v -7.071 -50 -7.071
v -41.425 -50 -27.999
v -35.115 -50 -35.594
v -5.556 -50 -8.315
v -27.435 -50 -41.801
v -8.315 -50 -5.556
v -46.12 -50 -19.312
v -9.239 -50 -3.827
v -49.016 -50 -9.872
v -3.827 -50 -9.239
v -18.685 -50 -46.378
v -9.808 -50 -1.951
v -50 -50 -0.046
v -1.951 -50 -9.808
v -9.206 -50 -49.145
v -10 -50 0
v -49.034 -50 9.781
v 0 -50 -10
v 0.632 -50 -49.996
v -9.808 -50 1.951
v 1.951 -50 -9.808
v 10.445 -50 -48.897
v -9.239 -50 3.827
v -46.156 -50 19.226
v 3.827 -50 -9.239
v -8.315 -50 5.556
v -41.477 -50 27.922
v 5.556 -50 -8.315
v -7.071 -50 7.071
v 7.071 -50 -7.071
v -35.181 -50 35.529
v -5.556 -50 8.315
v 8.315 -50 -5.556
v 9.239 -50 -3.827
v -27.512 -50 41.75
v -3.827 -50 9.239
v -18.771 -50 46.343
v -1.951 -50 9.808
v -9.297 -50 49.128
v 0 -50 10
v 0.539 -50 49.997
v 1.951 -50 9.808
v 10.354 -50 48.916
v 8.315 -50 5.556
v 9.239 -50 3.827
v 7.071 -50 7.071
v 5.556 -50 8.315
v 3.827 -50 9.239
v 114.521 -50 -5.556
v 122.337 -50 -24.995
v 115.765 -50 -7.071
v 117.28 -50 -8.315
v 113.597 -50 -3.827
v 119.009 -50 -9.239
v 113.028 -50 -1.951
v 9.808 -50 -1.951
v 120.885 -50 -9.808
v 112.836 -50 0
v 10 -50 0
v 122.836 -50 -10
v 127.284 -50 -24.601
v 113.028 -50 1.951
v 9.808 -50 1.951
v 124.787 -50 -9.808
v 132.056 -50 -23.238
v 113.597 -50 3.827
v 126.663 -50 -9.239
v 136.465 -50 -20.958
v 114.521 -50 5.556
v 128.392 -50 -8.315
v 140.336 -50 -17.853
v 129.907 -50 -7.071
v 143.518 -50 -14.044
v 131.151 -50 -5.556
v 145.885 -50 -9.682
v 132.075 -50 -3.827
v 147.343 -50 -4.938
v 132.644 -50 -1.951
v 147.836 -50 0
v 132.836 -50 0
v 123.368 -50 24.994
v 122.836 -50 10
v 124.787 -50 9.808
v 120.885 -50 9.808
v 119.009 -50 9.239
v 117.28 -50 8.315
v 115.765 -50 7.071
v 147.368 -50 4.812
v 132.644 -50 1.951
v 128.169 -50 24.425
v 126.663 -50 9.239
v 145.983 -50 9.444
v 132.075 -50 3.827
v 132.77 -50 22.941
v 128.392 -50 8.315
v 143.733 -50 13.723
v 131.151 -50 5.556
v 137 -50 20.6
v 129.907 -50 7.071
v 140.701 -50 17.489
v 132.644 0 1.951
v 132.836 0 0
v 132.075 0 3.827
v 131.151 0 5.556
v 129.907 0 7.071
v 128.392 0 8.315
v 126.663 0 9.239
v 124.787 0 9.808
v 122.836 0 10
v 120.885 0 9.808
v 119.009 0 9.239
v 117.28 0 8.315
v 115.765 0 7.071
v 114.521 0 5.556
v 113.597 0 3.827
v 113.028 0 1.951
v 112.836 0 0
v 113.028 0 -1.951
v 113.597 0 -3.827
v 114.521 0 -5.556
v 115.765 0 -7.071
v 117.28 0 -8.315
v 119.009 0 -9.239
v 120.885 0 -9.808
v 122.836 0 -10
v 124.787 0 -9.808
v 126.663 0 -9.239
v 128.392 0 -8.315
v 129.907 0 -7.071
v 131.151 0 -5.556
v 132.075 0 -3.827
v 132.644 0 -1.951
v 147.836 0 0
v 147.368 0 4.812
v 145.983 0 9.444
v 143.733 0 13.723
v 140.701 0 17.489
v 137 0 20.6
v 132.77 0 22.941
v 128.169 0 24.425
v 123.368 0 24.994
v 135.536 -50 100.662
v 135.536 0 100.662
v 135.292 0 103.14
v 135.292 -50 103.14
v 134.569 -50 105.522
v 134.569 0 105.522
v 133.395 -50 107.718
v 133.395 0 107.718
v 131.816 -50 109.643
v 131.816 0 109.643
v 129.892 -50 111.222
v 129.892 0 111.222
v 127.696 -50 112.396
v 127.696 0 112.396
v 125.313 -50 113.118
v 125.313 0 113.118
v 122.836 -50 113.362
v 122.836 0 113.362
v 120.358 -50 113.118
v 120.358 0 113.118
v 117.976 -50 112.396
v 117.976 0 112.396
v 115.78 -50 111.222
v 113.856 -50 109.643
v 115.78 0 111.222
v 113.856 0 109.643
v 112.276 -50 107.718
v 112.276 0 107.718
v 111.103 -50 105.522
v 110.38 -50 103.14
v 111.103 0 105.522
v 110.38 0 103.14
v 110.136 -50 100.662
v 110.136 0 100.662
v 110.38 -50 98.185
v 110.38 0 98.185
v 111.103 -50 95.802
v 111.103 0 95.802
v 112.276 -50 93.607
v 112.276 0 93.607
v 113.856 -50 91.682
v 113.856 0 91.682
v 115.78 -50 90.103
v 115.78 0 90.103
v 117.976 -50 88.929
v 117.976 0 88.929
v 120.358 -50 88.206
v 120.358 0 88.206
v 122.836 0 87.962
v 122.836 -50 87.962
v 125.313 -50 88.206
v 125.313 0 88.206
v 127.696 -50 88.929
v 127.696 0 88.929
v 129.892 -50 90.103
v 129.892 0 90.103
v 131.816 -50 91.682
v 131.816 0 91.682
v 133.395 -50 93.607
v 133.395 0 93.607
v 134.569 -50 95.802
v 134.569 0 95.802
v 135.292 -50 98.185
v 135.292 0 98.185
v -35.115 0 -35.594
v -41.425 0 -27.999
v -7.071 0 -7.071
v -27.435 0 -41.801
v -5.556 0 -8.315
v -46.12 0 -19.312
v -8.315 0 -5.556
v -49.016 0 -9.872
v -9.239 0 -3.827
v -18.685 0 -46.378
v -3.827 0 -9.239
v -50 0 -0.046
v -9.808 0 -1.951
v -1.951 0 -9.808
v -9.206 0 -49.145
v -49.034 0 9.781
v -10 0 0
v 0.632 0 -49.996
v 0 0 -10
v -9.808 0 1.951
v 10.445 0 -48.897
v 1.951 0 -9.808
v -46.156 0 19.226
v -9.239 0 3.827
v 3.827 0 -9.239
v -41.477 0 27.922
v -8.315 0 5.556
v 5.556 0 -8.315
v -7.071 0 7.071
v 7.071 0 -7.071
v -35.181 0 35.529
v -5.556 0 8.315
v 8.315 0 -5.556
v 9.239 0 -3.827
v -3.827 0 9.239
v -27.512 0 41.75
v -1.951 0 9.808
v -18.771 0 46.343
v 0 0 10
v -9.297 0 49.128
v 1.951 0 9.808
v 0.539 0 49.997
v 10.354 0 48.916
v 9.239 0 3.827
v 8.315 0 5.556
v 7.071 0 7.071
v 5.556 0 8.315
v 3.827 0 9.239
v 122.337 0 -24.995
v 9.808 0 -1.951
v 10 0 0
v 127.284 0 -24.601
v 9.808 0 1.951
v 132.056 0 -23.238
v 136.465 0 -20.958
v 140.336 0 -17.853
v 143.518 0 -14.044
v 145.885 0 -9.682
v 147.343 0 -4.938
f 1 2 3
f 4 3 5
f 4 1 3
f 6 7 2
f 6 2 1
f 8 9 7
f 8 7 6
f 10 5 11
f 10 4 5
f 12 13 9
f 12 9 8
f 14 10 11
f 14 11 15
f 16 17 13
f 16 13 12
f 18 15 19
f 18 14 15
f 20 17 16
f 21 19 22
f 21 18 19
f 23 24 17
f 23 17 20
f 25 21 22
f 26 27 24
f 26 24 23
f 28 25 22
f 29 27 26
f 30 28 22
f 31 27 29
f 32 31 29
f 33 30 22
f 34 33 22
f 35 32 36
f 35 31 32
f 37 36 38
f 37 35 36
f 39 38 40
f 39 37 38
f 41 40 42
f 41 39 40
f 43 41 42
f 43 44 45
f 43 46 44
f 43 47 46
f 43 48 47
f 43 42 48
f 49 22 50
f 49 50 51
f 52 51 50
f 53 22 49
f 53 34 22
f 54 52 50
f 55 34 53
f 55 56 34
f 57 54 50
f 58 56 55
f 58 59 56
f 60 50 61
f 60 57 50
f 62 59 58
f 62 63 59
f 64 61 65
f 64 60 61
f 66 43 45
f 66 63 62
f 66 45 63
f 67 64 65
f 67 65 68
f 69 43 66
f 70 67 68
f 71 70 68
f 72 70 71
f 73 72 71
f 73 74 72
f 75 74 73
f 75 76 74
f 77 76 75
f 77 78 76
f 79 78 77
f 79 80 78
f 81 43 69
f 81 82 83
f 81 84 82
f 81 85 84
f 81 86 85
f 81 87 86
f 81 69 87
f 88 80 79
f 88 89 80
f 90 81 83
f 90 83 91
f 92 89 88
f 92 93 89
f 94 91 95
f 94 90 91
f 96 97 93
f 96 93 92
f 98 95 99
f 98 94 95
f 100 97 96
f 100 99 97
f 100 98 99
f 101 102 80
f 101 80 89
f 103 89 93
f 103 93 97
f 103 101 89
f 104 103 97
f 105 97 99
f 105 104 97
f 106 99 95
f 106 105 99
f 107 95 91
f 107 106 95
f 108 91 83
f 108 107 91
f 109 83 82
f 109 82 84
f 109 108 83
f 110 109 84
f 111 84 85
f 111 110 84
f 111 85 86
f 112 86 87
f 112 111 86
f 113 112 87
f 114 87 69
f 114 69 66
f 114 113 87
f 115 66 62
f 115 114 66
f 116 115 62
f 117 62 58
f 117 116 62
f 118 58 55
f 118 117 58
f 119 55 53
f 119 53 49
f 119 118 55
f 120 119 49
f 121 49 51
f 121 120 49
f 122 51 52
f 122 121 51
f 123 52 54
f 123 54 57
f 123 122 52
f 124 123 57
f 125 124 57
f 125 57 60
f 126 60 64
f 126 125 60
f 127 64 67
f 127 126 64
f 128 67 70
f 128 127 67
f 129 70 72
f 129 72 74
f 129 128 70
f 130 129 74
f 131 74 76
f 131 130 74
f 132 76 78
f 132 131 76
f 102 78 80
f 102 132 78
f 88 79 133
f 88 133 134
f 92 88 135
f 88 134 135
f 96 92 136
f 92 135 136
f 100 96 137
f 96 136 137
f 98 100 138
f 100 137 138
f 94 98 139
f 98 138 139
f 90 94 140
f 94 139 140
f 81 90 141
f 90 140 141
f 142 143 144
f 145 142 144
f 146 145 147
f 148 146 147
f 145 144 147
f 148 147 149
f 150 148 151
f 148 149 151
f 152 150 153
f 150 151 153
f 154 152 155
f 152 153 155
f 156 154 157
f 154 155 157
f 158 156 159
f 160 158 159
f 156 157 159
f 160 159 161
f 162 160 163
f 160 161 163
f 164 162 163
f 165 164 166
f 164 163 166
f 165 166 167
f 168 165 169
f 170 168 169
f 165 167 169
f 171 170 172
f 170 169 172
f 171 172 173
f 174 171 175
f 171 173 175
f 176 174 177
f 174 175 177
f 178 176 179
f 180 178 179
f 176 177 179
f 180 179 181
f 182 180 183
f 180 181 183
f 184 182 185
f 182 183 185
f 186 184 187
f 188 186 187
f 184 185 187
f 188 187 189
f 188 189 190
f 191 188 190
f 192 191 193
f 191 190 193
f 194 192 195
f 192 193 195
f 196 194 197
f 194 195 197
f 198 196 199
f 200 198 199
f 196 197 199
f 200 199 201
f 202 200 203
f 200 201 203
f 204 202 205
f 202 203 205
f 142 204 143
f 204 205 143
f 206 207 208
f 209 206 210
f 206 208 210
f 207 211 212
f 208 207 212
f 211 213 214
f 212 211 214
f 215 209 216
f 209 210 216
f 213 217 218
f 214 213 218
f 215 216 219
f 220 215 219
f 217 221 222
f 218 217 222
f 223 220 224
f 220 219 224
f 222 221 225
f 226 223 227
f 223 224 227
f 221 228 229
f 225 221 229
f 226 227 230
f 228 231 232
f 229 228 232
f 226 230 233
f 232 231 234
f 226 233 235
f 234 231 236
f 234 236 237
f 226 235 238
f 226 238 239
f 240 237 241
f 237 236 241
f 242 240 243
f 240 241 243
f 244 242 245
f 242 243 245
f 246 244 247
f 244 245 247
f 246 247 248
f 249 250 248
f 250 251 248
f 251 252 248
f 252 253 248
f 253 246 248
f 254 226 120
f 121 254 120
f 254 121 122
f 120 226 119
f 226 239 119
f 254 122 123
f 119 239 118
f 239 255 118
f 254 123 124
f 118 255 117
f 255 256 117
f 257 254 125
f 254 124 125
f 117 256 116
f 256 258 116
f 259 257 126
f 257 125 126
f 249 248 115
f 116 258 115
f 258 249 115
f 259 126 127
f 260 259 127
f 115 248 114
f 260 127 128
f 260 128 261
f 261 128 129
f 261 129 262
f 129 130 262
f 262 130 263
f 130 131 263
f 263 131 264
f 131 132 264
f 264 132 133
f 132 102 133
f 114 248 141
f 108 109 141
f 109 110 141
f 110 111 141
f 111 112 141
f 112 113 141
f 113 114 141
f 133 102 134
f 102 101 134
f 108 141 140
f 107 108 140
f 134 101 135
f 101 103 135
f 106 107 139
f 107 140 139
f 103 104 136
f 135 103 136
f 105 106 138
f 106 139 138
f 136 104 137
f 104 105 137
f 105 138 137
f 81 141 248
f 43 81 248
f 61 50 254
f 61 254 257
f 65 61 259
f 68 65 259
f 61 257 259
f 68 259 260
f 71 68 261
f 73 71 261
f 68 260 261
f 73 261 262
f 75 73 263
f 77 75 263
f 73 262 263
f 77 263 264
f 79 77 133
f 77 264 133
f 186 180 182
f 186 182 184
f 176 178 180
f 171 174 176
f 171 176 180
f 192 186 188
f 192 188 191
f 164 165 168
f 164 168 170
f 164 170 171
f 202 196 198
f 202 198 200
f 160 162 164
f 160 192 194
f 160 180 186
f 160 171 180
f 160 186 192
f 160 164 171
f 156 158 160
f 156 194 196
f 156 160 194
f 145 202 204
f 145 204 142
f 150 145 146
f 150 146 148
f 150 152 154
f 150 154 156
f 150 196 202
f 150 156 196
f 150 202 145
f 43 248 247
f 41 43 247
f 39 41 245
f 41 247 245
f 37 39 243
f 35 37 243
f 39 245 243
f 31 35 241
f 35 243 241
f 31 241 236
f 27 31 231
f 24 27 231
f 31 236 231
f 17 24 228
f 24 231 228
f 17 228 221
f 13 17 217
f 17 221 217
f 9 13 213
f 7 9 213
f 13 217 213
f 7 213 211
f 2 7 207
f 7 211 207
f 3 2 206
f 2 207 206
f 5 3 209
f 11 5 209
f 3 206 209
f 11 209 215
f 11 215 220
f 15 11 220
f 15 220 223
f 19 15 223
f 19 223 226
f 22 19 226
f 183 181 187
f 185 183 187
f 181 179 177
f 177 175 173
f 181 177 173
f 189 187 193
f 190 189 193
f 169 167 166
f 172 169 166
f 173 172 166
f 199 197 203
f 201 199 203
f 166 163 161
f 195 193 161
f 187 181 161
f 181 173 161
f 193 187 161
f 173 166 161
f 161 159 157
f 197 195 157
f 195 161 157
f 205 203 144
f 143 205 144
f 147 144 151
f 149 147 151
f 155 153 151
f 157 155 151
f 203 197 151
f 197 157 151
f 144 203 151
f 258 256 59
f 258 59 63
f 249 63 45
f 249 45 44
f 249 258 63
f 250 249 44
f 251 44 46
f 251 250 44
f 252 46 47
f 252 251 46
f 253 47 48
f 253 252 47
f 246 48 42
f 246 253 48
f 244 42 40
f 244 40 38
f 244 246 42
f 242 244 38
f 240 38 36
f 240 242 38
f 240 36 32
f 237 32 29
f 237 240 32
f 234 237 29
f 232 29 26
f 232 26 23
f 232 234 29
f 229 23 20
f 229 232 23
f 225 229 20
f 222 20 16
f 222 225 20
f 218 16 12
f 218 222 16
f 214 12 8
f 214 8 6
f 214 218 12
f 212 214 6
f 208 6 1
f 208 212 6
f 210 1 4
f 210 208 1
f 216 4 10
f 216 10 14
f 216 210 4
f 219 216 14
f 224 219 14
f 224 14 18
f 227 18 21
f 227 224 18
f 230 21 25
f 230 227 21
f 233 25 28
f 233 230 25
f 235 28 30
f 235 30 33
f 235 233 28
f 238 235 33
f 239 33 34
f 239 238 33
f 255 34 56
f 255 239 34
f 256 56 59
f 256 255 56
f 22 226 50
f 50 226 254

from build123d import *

# Parameters (mm, degrees)
F0_R     = 10
F0_R_2   = 12.7
F1_DEPTH = 50


with BuildPart() as f1:
    # F0 (on Front) → F1 (new body)
    with BuildSketch(Plane.XZ):
        with BuildLine():
            ThreePointArc((10.445122, -48.896824), (38.873231, -31.446334), (50, 0))
            ThreePointArc((50, 0), (38.84398, 31.482459), (10.35419, 48.91616))
            ThreePointArc((10.35419, 48.91616), (-49.999978, -0.046483), (10.445122, -48.896824))
        make_face()
        Circle(F0_R, mode=Mode.SUBTRACT)
        with BuildLine():
            ThreePointArc((10.35419, 48.91616), (38.84398, 31.482459), (50, 0))
            ThreePointArc((50, 0), (38.873231, -31.446334), (10.445122, -48.896824))
            Line((10.445122, -48.896824), (122.336807, -24.995019))
            ThreePointArc((122.336807, -24.995019), (97.841123, 0.515458), (123.367723, 24.994341))
            Line((123.367723, 24.994341), (10.35419, 48.91616))
        make_face()
        with BuildLine():
            ThreePointArc((147.835808, 0), (140.700548, 17.488598), (123.367723, 24.994341))
            ThreePointArc((123.367723, 24.994341), (97.841123, 0.515458), (122.336807, -24.995019))
            ThreePointArc((122.336807, -24.995019), (140.336165, -17.853221), (147.835808, 0))
        make_face()
        with Locations((122.835808, 0)):
            Circle(F0_R, mode=Mode.SUBTRACT)
        with Locations((122.835808, 100.662315)):
            Circle(F0_R_2)
    extrude(amount=F1_DEPTH)


solid = f1.part
